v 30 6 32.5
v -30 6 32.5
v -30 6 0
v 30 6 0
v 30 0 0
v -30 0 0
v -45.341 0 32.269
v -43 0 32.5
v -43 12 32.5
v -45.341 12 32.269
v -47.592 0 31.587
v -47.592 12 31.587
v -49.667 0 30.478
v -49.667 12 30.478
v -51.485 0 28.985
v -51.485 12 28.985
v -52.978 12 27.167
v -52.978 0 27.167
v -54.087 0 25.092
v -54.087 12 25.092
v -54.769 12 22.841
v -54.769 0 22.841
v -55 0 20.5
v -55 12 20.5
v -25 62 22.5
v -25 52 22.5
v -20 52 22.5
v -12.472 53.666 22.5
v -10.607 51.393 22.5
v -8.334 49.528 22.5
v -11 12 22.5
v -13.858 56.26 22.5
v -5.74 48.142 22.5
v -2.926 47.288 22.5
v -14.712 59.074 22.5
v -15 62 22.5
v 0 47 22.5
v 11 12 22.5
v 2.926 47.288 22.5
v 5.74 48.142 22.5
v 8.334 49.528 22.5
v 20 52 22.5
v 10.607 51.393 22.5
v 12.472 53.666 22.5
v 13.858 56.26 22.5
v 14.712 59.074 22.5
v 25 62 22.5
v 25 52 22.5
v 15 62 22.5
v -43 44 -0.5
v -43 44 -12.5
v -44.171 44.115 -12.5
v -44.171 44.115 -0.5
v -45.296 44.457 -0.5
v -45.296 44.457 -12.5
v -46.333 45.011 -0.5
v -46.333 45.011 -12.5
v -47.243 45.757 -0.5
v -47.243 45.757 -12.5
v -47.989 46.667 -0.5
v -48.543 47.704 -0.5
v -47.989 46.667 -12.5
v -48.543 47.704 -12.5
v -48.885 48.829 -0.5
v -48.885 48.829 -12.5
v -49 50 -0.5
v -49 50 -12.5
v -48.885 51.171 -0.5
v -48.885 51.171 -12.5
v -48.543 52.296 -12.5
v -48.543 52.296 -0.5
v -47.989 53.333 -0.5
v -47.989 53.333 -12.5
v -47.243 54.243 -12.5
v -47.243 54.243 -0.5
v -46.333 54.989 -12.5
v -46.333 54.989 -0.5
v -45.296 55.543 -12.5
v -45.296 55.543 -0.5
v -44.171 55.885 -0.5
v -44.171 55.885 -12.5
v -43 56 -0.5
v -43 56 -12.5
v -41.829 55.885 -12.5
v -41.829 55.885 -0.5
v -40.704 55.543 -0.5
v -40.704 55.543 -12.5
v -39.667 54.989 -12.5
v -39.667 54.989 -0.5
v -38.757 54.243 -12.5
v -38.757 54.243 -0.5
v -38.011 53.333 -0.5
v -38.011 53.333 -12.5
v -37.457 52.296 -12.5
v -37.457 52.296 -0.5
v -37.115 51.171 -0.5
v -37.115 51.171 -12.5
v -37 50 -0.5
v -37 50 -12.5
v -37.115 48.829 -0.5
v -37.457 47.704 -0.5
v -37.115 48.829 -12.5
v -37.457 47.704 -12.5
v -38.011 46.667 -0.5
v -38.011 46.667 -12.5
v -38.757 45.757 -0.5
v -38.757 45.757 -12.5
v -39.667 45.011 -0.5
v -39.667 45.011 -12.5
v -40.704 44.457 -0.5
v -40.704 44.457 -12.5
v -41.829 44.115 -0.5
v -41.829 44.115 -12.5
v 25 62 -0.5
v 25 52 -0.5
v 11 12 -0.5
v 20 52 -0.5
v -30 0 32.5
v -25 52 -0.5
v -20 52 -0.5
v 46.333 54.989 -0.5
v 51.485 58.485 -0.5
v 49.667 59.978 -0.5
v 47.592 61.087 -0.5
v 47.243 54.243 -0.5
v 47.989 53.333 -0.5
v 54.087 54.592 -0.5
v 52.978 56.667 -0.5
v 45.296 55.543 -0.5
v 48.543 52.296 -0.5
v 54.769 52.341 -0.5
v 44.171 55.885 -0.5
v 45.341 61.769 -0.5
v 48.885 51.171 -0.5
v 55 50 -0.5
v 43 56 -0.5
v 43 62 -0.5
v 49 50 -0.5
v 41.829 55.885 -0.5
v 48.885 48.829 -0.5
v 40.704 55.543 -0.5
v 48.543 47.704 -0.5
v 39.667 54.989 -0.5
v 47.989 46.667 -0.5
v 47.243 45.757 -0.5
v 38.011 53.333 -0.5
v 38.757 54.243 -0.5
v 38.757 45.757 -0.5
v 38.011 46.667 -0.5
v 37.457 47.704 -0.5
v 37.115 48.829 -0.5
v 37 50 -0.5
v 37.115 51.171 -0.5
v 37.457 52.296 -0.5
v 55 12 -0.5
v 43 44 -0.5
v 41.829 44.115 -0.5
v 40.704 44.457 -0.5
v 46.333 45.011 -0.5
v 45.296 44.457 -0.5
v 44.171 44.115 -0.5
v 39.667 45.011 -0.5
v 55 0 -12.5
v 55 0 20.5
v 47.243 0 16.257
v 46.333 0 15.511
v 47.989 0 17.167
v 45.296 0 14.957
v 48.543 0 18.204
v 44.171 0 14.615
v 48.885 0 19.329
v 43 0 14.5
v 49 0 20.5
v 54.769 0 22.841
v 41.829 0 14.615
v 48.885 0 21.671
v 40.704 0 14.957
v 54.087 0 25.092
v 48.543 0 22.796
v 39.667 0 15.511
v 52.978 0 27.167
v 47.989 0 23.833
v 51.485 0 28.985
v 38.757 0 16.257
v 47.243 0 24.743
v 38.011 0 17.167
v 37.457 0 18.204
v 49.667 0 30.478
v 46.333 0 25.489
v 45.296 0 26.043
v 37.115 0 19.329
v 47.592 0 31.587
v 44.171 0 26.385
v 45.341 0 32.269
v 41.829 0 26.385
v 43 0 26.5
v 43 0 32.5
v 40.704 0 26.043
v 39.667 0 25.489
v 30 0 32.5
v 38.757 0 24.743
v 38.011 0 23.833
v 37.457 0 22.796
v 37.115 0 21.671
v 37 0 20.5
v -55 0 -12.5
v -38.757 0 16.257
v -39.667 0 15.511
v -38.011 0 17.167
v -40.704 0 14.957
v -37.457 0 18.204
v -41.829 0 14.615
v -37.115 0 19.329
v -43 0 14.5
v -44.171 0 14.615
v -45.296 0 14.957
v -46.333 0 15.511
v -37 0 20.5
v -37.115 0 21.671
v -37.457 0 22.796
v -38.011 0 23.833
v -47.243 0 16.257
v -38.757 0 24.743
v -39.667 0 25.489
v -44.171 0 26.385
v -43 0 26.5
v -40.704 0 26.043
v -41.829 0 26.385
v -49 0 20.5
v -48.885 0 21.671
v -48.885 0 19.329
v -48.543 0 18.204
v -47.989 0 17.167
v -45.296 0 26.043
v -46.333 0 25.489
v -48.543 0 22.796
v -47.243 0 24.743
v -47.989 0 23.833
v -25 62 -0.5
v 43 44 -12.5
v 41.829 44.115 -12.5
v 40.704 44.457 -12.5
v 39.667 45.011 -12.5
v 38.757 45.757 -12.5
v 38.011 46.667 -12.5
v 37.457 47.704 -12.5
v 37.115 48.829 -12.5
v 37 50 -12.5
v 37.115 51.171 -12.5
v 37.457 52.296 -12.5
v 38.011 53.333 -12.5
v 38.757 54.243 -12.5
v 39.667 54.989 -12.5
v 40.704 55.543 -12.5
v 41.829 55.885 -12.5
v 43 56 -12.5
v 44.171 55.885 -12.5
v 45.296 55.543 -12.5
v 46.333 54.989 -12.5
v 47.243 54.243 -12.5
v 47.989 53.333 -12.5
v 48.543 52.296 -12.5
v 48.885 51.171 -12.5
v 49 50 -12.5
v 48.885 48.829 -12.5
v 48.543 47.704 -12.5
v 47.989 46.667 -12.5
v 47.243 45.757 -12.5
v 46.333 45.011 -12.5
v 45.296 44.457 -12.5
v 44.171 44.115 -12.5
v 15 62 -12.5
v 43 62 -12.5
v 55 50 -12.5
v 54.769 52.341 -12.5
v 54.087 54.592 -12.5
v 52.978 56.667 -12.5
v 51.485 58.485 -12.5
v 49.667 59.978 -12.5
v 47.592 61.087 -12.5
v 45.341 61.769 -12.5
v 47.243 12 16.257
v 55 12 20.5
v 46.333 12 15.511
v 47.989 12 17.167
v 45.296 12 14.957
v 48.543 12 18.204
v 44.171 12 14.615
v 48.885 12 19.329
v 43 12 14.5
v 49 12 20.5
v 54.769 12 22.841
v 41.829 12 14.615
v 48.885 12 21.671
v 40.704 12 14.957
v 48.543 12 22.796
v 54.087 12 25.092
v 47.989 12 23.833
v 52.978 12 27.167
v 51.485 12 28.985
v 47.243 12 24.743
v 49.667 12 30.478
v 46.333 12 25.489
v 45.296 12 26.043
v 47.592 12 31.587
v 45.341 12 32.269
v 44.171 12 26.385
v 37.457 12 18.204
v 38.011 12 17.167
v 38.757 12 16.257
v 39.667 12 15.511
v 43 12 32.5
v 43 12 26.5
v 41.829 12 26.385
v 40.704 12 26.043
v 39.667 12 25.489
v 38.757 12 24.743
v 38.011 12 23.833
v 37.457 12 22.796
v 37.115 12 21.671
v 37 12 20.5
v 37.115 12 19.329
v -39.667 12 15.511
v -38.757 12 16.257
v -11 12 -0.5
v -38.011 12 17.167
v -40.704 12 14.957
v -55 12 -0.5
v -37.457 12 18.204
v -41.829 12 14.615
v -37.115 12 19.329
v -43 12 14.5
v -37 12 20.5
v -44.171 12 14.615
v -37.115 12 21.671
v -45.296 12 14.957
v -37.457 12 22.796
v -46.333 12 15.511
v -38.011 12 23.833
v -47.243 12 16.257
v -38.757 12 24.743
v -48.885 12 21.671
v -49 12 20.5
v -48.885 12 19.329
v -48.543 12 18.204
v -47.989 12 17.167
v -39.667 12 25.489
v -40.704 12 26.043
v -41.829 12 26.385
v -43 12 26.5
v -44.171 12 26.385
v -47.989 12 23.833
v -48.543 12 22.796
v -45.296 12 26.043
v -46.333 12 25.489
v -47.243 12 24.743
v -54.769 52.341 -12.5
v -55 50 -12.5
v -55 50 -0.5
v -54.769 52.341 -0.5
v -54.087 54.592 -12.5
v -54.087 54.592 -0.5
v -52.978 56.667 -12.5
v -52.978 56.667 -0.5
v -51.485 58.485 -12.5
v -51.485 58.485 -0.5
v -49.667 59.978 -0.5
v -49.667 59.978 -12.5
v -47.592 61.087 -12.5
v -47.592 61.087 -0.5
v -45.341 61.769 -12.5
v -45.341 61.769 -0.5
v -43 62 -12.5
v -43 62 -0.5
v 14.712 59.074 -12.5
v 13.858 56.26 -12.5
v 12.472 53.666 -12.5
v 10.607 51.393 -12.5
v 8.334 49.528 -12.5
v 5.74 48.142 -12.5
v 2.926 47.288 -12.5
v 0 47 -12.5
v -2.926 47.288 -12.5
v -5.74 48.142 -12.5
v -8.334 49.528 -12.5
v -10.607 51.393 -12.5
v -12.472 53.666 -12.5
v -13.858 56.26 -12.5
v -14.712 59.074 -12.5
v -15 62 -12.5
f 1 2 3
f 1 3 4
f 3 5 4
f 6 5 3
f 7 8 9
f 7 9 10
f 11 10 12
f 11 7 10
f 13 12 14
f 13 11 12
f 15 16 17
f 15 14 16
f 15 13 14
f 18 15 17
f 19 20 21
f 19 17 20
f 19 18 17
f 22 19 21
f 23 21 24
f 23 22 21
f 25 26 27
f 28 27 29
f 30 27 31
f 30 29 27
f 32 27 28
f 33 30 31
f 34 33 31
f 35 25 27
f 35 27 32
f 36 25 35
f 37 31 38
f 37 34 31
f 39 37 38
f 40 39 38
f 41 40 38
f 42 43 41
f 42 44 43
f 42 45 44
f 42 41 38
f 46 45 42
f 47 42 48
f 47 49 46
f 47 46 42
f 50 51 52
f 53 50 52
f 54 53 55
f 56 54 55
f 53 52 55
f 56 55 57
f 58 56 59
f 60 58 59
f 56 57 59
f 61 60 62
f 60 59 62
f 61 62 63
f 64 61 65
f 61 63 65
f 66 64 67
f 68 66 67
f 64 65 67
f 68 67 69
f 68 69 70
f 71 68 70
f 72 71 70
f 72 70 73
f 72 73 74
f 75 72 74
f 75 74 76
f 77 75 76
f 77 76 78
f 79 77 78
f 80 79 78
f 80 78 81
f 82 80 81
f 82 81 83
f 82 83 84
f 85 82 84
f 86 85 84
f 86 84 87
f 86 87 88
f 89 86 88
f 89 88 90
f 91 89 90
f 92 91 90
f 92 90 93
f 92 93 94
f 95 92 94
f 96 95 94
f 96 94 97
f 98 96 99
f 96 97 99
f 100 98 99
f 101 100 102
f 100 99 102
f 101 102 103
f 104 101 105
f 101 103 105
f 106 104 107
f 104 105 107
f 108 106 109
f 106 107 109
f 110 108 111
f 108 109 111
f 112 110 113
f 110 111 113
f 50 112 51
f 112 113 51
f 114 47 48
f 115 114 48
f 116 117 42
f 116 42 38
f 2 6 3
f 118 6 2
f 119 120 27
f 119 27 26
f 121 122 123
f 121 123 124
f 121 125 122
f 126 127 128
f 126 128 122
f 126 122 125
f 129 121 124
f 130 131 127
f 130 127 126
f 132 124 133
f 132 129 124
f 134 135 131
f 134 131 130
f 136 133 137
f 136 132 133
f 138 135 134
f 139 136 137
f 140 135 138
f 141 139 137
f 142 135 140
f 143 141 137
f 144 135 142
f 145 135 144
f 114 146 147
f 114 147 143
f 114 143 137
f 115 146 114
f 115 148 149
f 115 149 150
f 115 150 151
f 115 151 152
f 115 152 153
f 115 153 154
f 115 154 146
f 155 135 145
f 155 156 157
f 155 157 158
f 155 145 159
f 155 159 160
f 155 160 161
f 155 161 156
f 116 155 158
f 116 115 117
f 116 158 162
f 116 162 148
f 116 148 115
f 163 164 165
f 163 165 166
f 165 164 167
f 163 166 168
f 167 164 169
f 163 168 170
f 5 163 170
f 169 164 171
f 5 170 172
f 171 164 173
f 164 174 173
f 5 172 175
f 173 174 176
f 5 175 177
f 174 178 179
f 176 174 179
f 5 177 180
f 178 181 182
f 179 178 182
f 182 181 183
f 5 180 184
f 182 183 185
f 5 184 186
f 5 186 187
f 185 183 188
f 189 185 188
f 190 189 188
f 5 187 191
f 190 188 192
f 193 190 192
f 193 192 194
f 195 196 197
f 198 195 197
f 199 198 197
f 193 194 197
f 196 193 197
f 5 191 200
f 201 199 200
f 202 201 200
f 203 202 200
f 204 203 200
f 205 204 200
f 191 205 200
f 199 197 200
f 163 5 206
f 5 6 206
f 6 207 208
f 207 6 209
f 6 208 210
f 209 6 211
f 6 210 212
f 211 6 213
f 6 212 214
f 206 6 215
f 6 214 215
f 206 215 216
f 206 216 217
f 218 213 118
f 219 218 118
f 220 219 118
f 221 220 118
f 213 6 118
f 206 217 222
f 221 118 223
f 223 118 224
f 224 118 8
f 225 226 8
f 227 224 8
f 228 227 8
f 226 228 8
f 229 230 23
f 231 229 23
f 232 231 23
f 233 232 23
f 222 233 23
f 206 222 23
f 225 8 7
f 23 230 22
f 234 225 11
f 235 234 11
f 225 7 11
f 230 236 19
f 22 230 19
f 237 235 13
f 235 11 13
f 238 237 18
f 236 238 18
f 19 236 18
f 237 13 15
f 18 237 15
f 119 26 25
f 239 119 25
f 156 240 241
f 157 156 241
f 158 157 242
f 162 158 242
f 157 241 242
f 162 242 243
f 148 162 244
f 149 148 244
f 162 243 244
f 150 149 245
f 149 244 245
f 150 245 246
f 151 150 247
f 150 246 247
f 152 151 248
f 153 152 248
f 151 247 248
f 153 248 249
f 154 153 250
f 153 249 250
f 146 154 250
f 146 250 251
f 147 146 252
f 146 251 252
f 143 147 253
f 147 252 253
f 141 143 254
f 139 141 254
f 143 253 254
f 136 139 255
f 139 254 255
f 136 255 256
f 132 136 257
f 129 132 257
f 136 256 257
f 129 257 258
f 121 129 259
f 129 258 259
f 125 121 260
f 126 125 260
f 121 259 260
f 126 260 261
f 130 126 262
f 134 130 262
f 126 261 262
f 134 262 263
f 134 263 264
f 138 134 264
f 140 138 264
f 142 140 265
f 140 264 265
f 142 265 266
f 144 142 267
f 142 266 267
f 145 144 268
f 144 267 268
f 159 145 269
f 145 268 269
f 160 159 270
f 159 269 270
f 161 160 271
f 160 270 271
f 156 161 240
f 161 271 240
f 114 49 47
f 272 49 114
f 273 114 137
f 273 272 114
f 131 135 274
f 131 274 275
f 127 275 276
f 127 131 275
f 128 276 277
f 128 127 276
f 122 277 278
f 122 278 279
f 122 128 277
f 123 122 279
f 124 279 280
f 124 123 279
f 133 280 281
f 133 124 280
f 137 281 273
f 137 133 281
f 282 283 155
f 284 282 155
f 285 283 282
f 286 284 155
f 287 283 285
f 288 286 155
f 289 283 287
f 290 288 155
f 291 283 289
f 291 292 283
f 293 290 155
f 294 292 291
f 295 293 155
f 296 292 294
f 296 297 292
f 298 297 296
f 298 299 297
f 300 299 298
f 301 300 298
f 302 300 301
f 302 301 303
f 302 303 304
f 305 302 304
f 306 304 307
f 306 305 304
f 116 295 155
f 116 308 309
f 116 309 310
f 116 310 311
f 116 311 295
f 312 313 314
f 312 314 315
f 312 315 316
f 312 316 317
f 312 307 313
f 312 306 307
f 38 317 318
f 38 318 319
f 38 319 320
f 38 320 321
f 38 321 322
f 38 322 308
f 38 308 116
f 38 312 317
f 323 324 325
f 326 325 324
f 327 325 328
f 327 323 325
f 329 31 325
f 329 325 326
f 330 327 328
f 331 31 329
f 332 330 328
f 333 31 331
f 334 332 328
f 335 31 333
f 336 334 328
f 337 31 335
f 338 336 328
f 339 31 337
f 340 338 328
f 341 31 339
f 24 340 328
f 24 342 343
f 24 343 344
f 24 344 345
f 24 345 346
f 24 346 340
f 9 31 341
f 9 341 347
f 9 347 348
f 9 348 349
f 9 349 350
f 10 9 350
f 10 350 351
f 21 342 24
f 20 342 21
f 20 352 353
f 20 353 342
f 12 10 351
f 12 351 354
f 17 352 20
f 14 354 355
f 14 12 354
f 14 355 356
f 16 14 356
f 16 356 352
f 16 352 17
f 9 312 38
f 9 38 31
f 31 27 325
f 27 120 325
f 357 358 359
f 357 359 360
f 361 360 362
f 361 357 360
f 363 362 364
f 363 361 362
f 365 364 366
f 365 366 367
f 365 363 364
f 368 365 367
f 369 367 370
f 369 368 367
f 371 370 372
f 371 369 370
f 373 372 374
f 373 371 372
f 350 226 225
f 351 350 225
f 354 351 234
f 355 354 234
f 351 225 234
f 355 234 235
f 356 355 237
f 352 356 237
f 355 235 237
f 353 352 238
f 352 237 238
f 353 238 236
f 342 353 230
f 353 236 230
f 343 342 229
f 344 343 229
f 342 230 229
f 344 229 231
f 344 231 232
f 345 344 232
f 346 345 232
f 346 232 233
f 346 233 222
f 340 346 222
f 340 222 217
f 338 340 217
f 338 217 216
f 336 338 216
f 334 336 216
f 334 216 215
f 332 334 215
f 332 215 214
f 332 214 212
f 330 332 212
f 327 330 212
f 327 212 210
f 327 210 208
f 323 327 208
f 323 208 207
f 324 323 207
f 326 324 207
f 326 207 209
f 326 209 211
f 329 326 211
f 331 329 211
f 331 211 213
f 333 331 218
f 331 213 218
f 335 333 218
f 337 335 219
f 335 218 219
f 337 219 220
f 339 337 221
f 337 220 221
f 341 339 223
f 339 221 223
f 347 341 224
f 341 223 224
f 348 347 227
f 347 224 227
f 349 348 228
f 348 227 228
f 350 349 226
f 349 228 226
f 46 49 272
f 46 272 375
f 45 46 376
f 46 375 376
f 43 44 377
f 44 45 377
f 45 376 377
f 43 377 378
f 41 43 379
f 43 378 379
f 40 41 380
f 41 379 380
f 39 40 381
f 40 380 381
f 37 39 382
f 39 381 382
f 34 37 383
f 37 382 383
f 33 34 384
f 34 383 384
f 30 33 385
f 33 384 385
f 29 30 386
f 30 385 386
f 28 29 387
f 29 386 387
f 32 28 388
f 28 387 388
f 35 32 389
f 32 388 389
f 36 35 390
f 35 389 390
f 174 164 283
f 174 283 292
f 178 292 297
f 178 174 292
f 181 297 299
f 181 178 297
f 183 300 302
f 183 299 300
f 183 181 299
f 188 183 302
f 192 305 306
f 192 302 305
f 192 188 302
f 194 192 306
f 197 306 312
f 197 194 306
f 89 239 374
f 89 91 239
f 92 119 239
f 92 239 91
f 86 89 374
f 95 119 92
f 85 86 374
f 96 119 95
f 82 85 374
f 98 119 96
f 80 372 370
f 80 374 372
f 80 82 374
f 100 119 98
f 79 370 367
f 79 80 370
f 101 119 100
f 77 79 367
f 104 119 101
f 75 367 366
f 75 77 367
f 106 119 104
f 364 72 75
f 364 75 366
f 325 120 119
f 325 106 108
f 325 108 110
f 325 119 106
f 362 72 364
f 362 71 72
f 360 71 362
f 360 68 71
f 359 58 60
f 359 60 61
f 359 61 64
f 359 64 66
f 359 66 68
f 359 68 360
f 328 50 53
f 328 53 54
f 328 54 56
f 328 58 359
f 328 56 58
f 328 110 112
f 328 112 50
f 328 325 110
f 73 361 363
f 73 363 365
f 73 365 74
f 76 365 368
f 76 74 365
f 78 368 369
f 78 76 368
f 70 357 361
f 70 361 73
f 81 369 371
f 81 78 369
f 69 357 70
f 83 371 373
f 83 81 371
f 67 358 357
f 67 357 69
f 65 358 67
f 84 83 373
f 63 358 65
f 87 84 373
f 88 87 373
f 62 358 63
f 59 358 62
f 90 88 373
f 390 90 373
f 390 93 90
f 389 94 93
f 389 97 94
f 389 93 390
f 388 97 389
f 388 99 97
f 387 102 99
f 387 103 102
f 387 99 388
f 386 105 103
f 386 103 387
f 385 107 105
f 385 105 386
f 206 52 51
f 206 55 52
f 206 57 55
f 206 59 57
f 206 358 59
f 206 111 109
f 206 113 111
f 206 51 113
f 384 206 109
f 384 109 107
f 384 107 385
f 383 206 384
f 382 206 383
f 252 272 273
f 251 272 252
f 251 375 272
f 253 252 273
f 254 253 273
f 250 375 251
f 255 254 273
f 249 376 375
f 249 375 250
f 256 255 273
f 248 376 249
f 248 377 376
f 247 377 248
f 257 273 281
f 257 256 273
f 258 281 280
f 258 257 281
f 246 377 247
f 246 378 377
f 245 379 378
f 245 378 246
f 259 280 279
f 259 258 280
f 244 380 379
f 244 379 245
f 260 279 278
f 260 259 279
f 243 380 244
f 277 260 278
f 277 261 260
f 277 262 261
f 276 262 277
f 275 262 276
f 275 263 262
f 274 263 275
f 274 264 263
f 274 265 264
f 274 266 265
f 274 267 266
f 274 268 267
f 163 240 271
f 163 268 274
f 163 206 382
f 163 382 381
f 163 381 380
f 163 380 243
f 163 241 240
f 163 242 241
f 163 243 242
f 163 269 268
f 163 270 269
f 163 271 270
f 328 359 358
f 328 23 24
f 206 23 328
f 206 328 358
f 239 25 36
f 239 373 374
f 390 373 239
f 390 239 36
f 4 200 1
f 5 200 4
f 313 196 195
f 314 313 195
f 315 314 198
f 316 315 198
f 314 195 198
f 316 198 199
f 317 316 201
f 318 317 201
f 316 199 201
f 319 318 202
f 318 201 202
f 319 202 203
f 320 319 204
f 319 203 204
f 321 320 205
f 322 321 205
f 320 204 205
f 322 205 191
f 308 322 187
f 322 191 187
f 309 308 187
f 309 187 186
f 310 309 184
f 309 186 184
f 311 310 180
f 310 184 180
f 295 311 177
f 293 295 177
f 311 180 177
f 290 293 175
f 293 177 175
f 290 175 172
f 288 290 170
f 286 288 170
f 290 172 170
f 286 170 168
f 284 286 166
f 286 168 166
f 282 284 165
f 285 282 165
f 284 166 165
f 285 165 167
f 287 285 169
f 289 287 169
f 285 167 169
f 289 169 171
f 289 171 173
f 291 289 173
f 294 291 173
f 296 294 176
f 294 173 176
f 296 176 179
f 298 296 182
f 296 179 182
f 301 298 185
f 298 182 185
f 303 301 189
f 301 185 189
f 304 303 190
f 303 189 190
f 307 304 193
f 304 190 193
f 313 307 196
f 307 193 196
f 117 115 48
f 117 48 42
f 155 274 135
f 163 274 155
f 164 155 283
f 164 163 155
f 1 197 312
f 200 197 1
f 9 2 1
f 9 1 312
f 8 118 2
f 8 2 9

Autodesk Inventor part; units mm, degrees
ref_plane "YZ Plane" through (0, 0, 0) normal (1, 0, 0) x (0, 1, 0)
ref_plane "XZ Plane" through (0, 0, 0) normal (0, 1, 0) x (-1, 0, 0)
ref_plane "XY Plane" through (0, 0, 0) normal (0, 0, 1) x (1, 0, 0)
sketch "Szkic1" plane through (0, 0, 0) normal (0, 1, 0) x (-1, 0, 0)
  line L0 (55, -12.5) -> (-55, -12.5)
  line L1 (-55, -12.5) -> (-55, 20.5)
  line L2 (-43, 32.5) -> (43, 32.5)
  line L3 (55, 20.5) -> (55, -12.5)
  arc A0 (55, 20.5) -> (43, 32.5) centre (43, 20.5) ccw
  arc A1 (-43, 32.5) -> (-55, 20.5) centre (-43, 20.5) ccw
  point P0 (0, 0)
  point P1 (-55, 32.5)
  point P2 (55, 32.5)
  dimension "d0" = 110
  dimension "d1" = 45
  dimension "d2" = 12
extrude "Wyciągnięcie proste1" add sketch "Szkic1" along normal blind 12
sketch "Szkic2" plane through (0, 12, 0) normal (0, 1, 0) x (1, 0, 0)
  line L0 (55, 12.5) -> (-55, 12.5) projected
  line L1 (-55, 12.5) -> (55, 12.5)
  line L2 (55, 12.5) -> (55, 0.5)
  line L3 (55, 0.5) -> (-55, 0.5)
  line L4 (-55, 0.5) -> (-55, 12.5)
  point P0 (0, 0)
  dimension "d5" = 12
extrude "Wyciągnięcie proste2" add sketch "Szkic2" along normal blind 50
fillet "Zaokrąglenie1" radius 12 2 edges at (55, 62, -6.5) (-55, 62, -6.5)
sketch "Szkic3" plane through (-55, 12, -0.5) normal (0, 0, 1) x (1, 0, 0)
  line L0 (98, 50) -> (12, 50) projected
  line L1 (30, 50) -> (80, 50)
  line L2 (80, 50) -> (80, 40)
  line L3 (80, 40) -> (30, 40)
  line L4 (30, 40) -> (30, 50)
  line L5 (0, 0) -> (0, 38) projected
  line L6 (35, 40) -> (44, 0)
  line L7 (110, 0) -> (0, 0) projected
  line L8 (75, 40) -> (66, 0)
  line L9 (44, 0) -> (66, 0)
  line L10 (44, 0) -> (66, 0)
  line L11 (110, 0) -> (110, 38) projected
  point P0 (55, -12)
  point P1 (66, 0)
  dimension "d9" = 50
  dimension "d10" = 30
  dimension "d11" = 10
  dimension "d12" = 44
  dimension "d13" = 44
extrude "Wyciągnięcie proste3" add sketch "Szkic3" along normal blind 23
sketch "Szkic4" plane through (-55, 12, 22.5) normal (0, 0, 1) x (1, 0, 0)
  line L0 (98, 50) -> (12, 50) projected
  point P0 (55, -12)
  point P1 (55, 50)
hole "Otwór1" at (0, 62, 22.5) direction (0, 0, -1) diameter 30 end through all
sketch "Szkic5" plane through (-55, 12, -0.5) normal (0, 0, 1) x (1, 0, 0)
  arc A0 (12, 50) -> (0, 38) centre (12, 38) ccw projected
  arc A1 (110, 38) -> (98, 50) centre (98, 38) ccw projected
  point P0 (55, -12)
hole "Otwór2" at (-43, 50, -0.5) at (43, 50, -0.5) direction (0, 0, -1) diameter 12 end through all
sketch "Szkic6" plane through (0, 12, 0) normal (0, 1, 0) x (1, 0, 0)
  arc A0 (-55, -20.5) -> (-43, -32.5) centre (-43, -20.5) ccw projected
  arc A1 (43, -32.5) -> (55, -20.5) centre (43, -20.5) ccw projected
  point P0 (0, 0)
hole "Otwór3" at (-43, 12, 20.5) at (43, 12, 20.5) direction (0, -1, 0) diameter 12 end through all
sketch "Szkic7" plane through (0, 0, 0) normal (0, -1, 0) x (1, 0, 0)
  line L0 (-43, 32.5) -> (43, 32.5) projected
  line L1 (-30, 32.5) -> (30, 32.5)
  line L2 (30, 32.5) -> (30, 0)
  line L3 (30, 0) -> (-30, 0)
  line L4 (-30, 0) -> (-30, 32.5)
  point P0 (0, 0)
  dimension "d37" = 60
extrude "Wyciągnięcie proste4" cut sketch "Szkic7" against normal blind 6
